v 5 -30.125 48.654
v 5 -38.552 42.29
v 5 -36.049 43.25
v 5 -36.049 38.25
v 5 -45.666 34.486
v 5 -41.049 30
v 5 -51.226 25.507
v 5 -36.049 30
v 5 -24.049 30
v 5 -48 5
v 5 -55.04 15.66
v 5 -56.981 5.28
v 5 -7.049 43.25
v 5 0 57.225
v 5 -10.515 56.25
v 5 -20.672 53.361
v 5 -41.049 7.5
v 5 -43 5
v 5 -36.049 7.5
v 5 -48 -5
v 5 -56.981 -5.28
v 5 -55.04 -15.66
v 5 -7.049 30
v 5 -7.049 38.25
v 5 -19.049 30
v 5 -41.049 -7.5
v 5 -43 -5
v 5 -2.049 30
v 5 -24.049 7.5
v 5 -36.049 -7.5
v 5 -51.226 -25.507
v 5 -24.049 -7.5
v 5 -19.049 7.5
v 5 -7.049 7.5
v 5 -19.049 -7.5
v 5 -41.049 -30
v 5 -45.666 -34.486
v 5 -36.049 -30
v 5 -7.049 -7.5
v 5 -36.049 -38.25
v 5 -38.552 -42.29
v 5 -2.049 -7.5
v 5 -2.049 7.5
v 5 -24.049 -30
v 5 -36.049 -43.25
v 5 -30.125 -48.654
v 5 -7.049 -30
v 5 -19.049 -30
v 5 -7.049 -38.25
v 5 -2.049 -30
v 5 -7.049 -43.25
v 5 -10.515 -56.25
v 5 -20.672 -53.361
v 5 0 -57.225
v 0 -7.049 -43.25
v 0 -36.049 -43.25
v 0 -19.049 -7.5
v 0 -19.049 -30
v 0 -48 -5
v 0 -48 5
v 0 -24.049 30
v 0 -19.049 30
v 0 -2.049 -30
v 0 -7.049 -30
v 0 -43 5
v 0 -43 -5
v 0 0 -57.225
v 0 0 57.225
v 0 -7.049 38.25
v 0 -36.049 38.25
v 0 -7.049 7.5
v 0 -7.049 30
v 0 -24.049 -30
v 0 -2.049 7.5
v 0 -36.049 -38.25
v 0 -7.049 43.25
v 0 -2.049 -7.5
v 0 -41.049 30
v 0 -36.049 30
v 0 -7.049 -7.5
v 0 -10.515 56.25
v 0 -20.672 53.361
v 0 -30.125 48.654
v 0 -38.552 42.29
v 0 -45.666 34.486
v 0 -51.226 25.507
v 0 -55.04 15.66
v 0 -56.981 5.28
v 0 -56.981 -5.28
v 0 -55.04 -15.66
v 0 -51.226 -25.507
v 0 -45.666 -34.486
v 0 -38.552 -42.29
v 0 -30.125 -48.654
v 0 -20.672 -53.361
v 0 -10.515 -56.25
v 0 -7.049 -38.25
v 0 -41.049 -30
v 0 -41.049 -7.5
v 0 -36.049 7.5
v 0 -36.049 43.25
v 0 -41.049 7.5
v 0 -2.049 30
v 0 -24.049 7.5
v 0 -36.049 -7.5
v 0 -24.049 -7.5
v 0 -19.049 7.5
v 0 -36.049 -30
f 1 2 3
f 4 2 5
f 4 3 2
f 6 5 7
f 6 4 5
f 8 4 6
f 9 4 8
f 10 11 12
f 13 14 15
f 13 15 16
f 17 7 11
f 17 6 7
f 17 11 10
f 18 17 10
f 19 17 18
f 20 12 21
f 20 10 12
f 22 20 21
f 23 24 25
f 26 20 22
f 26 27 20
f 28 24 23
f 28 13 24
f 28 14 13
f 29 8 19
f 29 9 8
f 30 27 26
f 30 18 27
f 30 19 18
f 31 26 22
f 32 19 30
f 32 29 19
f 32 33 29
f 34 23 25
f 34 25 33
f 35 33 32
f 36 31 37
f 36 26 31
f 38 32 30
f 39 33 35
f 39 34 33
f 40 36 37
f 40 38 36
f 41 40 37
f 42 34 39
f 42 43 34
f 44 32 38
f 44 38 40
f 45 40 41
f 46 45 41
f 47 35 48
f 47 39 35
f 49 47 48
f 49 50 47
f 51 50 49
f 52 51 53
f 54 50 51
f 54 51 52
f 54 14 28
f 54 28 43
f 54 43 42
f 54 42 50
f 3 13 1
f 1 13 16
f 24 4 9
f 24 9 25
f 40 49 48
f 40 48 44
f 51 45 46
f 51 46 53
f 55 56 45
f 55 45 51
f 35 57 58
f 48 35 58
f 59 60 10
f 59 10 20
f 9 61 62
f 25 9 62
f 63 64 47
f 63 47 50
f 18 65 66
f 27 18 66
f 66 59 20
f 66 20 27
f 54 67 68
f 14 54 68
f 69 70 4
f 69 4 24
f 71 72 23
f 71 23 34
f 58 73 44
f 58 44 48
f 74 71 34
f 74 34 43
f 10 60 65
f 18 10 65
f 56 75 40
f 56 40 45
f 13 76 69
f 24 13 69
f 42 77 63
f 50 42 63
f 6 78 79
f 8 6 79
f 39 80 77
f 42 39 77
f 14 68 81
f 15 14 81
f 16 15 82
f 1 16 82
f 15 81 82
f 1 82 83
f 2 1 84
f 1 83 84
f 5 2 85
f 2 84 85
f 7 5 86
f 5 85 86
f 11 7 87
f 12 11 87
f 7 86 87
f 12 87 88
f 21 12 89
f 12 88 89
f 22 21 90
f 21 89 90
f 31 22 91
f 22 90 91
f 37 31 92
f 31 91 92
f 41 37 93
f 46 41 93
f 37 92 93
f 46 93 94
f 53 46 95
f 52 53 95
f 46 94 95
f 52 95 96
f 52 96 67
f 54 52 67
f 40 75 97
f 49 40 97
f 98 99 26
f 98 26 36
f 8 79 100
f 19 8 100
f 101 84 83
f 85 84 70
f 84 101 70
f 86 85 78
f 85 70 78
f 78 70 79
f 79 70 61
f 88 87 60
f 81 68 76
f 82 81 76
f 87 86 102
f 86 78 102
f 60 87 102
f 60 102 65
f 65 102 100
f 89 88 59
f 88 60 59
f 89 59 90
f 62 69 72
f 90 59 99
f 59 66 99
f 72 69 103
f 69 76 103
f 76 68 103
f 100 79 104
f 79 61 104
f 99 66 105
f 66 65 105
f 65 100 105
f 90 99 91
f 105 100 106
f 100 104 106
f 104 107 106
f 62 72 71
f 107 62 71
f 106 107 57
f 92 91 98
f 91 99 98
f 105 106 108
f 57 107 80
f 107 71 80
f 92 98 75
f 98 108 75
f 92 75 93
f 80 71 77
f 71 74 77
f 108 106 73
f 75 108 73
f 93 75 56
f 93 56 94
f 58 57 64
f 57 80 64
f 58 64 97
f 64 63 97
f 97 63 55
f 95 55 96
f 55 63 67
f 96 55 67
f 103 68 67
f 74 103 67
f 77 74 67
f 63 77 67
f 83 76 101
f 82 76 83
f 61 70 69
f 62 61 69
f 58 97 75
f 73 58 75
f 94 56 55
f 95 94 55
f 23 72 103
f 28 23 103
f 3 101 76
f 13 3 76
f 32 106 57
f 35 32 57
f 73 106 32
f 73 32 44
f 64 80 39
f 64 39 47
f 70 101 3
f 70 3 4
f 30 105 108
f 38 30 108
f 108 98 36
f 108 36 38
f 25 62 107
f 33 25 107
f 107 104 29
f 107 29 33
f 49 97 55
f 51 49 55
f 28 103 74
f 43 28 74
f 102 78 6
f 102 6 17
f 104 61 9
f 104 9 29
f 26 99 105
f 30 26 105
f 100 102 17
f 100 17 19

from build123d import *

# Parameters (mm, degrees)
SKETCH1_W           = 22.5
SKETCH1_H           = 5
SKETCH1_W_2         = 10
SKETCH1_W_3         = 5
SKETCH1_H_2         = 29
BOSS_EXTRUDE1_DEPTH = 5


with BuildPart() as part:
    # Sketch1 → Boss-Extrude1 (new body)
    with BuildSketch(Plane(origin=(0, 0, 0), x_dir=(0, 0, -1), z_dir=(1, 0, 0))):
        with BuildLine():
            Line((57.224821465, 0), (-57.224821465, 0))
            ThreePointArc((-57.224821465, 0), (0, -57.224821465), (57.224821465, 0))
        make_face()
        with Locations((-18.75, -38.548791642)):
            Rectangle(SKETCH1_W, SKETCH1_H, mode=Mode.SUBTRACT)
        with Locations((0, -45.5)):
            Rectangle(SKETCH1_W_2, SKETCH1_H, mode=Mode.SUBTRACT)
        with Locations((18.75, -38.548791642)):
            Rectangle(SKETCH1_W, SKETCH1_H, mode=Mode.SUBTRACT)
        with Locations((-40.75, -21.548791642)):
            Rectangle(SKETCH1_W_3, SKETCH1_H_2, mode=Mode.SUBTRACT)
        with Locations((-18.75, -21.548791642)):
            Rectangle(SKETCH1_W, SKETCH1_H, mode=Mode.SUBTRACT)
        with Locations((-18.75, -4.548791642)):
            Rectangle(SKETCH1_W, SKETCH1_H, mode=Mode.SUBTRACT)
        with Locations((40.75, -21.548791642)):
            Rectangle(SKETCH1_W_3, SKETCH1_H_2, mode=Mode.SUBTRACT)
        with Locations((18.75, -21.548791642)):
            Rectangle(SKETCH1_W, SKETCH1_H, mode=Mode.SUBTRACT)
        with Locations((18.75, -4.548791642)):
            Rectangle(SKETCH1_W, SKETCH1_H, mode=Mode.SUBTRACT)
    extrude(amount=BOSS_EXTRUDE1_DEPTH)


solid = part.part
